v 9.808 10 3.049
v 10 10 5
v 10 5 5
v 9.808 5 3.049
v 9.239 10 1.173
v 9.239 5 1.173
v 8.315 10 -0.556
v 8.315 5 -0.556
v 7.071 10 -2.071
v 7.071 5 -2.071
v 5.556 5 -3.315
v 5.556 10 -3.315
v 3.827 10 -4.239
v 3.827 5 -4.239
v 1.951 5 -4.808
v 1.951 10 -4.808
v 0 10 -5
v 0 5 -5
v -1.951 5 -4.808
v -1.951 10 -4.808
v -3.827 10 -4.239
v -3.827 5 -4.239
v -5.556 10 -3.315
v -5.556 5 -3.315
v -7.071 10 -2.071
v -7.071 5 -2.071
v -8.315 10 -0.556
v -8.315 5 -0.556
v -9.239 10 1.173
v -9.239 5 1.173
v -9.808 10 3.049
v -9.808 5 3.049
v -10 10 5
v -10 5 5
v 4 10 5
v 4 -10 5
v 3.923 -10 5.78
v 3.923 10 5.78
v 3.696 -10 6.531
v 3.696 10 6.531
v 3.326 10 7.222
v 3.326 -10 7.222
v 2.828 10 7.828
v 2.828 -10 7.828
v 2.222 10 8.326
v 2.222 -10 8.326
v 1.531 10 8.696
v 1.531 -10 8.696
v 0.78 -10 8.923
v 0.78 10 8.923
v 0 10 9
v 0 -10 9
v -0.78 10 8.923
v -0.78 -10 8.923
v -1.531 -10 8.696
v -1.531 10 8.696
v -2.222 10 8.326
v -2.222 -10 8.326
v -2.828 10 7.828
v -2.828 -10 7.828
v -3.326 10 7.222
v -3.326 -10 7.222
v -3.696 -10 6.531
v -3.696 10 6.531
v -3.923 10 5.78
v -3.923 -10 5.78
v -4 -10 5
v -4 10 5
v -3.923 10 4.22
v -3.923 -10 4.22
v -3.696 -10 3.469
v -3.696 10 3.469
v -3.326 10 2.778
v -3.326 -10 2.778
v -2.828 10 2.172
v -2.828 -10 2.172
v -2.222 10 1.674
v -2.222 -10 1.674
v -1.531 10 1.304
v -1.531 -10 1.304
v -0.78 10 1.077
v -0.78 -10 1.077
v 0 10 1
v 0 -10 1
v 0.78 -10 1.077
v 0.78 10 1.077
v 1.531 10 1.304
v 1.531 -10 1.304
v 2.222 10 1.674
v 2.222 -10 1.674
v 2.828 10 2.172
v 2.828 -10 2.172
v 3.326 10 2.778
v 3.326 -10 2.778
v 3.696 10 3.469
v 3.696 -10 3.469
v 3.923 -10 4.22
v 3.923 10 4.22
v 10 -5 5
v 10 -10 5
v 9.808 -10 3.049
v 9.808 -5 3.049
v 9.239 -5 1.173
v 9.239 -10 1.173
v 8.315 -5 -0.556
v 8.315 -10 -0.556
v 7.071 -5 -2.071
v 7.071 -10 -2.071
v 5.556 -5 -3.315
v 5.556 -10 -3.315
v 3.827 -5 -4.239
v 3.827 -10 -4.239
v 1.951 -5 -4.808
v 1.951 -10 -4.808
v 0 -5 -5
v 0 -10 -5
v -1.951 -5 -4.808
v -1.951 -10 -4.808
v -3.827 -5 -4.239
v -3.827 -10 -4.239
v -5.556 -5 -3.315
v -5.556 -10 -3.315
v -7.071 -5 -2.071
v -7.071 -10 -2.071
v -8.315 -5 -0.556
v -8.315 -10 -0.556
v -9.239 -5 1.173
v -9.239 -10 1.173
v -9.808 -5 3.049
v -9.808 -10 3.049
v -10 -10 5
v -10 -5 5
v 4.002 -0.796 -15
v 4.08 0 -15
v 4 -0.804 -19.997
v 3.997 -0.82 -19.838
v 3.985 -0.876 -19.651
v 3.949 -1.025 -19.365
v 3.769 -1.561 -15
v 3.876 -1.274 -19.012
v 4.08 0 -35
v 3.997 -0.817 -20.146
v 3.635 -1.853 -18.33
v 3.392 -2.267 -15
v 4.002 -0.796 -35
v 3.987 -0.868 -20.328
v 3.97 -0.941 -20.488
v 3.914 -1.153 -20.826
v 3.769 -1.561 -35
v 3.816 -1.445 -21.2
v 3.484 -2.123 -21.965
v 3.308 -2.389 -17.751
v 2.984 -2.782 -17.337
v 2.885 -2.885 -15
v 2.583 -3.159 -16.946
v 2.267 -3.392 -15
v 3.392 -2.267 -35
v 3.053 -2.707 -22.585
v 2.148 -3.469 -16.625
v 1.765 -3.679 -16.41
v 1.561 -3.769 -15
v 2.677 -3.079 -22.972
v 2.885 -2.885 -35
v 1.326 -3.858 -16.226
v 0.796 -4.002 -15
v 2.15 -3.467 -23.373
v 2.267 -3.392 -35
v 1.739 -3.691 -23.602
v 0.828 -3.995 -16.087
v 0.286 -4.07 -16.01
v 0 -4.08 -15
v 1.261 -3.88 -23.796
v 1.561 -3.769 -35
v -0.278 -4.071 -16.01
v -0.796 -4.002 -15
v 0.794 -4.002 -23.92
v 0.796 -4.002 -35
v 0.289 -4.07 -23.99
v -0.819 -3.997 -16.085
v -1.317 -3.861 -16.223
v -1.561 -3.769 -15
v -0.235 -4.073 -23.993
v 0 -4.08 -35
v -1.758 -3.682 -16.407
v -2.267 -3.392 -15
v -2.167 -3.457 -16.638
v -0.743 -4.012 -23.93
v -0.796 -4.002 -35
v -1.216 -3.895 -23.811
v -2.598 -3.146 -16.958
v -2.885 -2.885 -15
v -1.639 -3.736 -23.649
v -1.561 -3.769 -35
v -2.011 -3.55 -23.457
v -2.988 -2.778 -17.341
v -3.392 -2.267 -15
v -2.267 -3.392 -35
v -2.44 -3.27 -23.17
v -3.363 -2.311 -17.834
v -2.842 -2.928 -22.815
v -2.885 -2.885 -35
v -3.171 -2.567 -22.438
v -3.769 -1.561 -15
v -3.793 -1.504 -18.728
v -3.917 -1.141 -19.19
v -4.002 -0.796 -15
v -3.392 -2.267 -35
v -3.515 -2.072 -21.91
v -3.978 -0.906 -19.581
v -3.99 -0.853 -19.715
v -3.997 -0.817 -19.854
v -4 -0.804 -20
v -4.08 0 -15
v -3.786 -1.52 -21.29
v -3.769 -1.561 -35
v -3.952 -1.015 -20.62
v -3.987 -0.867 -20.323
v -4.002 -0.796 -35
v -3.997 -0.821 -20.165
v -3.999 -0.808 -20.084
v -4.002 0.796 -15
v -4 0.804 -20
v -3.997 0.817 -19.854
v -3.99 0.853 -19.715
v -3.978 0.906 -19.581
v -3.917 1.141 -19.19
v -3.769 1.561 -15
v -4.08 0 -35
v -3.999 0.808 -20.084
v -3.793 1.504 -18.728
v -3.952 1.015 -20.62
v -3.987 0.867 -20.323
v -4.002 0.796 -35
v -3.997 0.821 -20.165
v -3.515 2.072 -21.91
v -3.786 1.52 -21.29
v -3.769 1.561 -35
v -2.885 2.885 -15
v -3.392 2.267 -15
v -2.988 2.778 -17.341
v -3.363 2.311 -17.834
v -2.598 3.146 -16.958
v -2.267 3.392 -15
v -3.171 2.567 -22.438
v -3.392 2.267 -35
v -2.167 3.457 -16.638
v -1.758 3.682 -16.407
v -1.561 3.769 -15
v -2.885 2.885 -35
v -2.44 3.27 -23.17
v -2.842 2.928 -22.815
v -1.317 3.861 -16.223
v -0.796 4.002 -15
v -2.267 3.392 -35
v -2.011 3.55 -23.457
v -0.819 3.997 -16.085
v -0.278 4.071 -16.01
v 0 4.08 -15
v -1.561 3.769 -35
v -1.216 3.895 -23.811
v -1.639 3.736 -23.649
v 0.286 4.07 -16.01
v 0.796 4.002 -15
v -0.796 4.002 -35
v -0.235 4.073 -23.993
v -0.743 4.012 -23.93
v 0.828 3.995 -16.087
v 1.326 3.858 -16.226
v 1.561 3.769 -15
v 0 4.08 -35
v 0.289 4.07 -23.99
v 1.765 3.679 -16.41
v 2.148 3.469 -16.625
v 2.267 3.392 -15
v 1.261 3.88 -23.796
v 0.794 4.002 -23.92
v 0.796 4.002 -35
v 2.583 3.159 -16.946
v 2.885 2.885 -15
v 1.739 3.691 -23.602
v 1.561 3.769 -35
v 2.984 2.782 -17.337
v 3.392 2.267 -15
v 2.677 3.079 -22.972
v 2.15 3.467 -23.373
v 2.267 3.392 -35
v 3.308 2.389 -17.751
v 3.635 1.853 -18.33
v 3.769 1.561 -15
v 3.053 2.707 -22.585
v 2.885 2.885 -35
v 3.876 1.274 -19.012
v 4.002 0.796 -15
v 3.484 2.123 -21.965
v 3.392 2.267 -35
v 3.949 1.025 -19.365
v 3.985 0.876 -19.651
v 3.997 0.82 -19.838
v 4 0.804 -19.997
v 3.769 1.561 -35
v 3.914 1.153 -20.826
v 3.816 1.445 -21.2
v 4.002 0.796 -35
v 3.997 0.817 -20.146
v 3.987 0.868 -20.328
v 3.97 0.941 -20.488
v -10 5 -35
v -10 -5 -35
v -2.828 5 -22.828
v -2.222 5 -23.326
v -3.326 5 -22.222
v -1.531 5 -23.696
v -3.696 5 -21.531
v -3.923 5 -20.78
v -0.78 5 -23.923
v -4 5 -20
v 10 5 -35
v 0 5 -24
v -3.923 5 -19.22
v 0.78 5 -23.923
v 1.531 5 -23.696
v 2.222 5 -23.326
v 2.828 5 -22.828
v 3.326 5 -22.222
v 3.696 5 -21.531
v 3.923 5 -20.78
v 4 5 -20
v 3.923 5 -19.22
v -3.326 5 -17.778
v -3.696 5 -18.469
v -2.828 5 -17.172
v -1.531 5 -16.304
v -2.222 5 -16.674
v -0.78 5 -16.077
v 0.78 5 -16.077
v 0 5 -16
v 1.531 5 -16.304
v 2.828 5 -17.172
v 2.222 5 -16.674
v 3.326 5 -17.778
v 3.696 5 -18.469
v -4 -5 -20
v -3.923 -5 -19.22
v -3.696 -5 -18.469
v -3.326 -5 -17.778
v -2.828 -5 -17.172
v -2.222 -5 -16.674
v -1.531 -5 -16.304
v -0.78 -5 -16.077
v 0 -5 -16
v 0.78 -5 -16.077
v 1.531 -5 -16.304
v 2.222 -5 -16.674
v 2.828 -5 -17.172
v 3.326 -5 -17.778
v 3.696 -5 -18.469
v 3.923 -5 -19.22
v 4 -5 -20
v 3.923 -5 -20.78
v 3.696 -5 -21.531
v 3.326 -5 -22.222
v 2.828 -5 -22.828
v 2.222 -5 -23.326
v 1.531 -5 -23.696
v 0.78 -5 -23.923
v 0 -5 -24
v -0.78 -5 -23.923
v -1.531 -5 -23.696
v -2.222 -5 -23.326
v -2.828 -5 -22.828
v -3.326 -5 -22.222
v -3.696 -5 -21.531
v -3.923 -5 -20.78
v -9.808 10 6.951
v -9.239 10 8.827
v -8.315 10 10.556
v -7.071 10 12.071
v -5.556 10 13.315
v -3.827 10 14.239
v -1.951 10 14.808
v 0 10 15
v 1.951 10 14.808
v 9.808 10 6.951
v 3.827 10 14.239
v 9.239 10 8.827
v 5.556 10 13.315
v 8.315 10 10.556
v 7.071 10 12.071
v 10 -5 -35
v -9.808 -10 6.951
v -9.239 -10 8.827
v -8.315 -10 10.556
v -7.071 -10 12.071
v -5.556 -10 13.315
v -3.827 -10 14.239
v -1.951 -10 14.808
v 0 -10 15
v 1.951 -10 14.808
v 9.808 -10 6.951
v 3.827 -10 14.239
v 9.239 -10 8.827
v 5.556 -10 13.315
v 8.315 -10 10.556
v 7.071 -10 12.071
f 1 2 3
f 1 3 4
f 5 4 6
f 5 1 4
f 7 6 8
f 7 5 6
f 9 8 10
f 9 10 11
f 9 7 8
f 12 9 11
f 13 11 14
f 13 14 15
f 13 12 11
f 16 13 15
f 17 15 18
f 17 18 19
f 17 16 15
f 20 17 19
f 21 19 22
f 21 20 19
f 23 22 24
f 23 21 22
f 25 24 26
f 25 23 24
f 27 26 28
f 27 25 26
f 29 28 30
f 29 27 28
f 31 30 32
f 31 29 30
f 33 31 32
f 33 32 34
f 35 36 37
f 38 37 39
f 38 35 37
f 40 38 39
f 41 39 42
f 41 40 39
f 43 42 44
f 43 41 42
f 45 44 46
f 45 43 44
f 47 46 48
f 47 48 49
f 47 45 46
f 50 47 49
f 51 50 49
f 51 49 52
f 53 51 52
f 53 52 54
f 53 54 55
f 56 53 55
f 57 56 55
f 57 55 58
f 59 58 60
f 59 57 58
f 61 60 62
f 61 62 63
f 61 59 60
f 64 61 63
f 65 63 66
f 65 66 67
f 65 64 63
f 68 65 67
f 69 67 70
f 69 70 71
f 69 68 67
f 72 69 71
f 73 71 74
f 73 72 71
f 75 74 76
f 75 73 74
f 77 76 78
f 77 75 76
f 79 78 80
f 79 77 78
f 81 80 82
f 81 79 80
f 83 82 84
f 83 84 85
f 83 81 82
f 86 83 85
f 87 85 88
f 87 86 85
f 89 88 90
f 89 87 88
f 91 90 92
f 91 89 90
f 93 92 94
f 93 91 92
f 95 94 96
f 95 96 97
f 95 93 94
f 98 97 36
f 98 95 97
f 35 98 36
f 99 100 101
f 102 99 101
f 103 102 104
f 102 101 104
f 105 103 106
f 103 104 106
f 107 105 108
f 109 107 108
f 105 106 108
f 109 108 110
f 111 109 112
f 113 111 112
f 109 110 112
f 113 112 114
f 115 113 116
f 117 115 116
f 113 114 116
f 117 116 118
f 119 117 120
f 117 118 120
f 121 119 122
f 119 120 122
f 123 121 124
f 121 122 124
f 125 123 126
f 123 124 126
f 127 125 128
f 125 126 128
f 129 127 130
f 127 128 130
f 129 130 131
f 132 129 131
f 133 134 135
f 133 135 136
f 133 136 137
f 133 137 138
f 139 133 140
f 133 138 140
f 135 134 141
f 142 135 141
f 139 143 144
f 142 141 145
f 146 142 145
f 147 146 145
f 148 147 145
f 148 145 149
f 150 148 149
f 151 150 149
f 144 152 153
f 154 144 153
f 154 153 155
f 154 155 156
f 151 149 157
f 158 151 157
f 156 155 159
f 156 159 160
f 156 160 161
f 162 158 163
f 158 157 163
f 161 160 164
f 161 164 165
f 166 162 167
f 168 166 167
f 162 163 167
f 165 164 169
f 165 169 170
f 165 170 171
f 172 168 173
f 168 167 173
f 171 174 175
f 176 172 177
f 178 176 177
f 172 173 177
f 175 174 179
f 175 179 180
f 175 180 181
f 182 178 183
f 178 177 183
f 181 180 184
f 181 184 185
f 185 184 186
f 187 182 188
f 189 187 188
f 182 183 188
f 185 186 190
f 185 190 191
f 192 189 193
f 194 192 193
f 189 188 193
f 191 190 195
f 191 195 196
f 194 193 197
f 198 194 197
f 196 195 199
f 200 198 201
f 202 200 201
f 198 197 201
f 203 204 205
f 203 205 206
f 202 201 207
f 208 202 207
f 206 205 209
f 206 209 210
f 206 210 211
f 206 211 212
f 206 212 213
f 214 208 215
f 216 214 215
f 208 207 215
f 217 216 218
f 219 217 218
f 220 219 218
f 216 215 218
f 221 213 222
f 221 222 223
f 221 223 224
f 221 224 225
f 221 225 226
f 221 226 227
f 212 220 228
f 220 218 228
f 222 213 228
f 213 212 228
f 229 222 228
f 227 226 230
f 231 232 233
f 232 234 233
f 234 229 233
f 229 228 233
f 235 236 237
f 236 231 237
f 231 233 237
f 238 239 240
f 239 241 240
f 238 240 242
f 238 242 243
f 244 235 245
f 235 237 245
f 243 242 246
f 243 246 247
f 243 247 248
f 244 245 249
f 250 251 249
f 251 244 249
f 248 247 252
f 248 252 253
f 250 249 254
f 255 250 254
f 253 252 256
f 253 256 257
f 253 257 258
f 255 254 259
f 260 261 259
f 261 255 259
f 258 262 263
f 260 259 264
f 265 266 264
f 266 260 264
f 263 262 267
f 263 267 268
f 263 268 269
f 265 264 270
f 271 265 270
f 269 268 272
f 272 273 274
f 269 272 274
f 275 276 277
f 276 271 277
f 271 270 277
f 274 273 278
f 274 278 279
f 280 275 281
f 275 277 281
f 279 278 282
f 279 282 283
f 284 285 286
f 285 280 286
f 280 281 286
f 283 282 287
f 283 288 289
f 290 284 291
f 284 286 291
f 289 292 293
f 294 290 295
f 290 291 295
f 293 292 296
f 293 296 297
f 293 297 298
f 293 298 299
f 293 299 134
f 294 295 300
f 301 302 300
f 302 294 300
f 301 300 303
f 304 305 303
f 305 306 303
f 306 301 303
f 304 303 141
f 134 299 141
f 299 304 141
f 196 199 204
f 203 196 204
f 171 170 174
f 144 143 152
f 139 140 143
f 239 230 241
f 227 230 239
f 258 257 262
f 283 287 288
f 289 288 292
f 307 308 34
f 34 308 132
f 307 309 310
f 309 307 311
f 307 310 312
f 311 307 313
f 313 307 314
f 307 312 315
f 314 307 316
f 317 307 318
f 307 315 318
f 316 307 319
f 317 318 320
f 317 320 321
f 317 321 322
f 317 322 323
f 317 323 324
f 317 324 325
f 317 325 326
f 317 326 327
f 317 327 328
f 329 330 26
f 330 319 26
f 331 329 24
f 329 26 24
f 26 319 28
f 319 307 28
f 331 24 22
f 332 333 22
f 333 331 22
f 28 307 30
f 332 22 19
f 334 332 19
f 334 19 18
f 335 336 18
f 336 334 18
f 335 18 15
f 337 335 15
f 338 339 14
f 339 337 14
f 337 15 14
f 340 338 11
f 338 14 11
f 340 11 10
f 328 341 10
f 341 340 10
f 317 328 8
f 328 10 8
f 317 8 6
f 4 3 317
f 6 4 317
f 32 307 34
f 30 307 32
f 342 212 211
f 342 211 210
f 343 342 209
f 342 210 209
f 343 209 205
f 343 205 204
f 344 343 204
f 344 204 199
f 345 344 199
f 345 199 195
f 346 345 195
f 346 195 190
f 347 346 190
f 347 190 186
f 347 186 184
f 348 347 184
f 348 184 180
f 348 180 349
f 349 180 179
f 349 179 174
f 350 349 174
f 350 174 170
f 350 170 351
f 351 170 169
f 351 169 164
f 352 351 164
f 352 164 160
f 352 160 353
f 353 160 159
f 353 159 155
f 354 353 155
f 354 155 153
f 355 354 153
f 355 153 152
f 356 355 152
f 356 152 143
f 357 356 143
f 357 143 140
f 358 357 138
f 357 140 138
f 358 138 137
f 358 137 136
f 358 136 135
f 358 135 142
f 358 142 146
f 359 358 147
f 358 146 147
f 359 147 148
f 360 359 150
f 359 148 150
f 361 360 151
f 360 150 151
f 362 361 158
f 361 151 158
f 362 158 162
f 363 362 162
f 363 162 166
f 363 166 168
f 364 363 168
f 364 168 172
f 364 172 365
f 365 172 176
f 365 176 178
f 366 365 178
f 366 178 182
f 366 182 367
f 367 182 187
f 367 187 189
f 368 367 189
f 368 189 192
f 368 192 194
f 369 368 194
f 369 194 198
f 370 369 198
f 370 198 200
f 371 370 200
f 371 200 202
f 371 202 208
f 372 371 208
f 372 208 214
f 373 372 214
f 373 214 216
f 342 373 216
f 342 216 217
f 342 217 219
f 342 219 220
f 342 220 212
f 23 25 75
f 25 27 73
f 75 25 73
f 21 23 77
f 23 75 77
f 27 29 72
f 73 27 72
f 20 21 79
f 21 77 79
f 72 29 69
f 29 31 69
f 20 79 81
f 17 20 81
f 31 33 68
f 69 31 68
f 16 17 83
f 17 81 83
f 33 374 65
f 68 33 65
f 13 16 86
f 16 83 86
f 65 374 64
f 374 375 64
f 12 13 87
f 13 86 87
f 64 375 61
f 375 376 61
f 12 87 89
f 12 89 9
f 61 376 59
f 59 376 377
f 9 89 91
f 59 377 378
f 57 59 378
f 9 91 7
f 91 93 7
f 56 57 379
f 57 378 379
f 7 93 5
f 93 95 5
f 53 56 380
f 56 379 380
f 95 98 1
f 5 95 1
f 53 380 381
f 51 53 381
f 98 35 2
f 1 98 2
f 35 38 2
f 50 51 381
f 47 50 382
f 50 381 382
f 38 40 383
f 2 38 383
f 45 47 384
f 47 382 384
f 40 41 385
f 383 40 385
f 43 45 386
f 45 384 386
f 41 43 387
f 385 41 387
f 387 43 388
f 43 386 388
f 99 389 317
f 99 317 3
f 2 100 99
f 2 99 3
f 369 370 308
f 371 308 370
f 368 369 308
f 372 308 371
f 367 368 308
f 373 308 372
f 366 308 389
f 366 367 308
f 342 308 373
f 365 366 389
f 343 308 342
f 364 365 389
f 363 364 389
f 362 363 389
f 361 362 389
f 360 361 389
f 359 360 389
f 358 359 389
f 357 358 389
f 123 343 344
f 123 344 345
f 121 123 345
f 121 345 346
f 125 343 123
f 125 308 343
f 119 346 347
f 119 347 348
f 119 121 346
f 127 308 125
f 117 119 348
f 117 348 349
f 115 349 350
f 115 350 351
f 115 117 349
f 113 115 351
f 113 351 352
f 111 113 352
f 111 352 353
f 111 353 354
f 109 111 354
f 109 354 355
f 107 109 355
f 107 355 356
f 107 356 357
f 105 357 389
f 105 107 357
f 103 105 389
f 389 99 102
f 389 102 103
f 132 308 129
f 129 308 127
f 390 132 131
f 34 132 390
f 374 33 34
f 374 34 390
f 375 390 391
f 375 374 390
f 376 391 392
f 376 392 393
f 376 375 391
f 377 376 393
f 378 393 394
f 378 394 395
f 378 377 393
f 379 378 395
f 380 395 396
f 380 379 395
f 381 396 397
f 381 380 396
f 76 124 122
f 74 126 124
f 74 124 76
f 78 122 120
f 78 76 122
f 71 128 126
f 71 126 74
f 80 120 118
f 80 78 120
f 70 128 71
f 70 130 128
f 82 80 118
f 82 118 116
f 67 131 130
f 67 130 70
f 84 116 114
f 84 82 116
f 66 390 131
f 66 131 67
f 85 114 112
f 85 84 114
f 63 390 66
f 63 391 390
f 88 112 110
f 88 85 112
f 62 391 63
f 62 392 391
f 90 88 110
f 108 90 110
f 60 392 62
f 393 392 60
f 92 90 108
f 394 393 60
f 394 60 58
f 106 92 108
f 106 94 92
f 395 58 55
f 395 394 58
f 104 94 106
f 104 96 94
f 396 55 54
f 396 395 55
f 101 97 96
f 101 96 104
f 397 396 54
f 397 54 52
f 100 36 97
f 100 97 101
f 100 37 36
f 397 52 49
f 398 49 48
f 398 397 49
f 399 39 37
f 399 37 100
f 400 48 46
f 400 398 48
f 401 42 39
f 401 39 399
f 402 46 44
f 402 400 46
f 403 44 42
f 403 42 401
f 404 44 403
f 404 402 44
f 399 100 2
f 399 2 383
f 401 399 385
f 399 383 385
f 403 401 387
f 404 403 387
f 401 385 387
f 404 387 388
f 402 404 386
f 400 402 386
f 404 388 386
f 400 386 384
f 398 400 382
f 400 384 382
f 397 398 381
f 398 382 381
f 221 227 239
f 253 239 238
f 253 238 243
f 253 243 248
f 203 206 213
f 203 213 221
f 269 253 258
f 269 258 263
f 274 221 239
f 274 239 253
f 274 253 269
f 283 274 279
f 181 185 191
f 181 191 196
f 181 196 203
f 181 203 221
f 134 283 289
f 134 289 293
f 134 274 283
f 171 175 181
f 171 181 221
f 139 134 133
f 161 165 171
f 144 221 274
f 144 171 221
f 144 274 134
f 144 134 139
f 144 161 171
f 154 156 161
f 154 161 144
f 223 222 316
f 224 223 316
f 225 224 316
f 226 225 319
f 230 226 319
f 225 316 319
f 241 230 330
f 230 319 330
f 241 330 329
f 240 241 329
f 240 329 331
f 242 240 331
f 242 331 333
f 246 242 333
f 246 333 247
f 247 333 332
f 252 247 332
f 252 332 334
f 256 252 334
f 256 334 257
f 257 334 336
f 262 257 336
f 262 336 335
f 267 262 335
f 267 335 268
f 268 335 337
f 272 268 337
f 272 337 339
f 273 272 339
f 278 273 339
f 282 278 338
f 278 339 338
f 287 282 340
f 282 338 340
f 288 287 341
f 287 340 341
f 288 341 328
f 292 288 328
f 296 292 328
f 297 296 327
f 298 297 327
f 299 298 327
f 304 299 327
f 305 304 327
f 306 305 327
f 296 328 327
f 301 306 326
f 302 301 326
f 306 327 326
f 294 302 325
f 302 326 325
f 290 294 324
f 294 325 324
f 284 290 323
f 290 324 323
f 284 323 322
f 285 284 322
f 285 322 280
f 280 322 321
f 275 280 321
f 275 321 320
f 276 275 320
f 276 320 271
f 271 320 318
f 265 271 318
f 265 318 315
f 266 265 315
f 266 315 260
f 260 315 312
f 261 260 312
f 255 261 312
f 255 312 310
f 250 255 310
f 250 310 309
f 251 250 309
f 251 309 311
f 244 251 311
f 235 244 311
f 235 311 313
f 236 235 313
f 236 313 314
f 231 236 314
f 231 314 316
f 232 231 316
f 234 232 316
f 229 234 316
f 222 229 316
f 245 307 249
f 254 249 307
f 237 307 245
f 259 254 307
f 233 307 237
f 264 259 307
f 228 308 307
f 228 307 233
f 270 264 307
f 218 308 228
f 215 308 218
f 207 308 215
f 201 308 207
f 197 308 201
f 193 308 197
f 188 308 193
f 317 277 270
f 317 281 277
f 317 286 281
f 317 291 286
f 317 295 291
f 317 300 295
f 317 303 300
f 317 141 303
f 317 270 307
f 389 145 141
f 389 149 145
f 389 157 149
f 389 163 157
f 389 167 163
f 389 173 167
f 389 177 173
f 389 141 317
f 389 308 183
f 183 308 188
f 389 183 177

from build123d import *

# Parameters (mm, degrees)
F0_W          = 20
F0_H          = 50
F0_R          = 4
F1_DEPTH      = 10
F1_DEPTH_BACK = 10
F2_R          = 9.99999
F3_R          = 4.08
F4_DEPTH      = 20
F6_D          = 8
F7_R          = 4
F8_DEPTH      = 5


# Not quite as in the source:
# - a fillet or chamfer is up to 0.001 mm smaller than in the source, because OpenCascade refuses the exact size
# - ends of sketch curves that miss each other by under 0.0002 mm in the source are joined
# - a pattern or mirror of a feature is missing from the dataset's text; its kind, count and spacing are read off the source's solid


with BuildPart() as f1:
    # F0 (on Front) → F1 (new body, two sides)
    with BuildSketch(Plane.XZ) as f1_sk:
        with Locations((0, -10)):
            Rectangle(F0_W, F0_H)
        with Locations((0, 5)):
            Circle(F0_R, mode=Mode.SUBTRACT)
    extrude(amount=F1_DEPTH)
    extrude(f1_sk.sketch, amount=-F1_DEPTH_BACK)

    # F2 (radius 10 in the source; OpenCascade refuses exactly that, so slightly less here)
    f2_edges = [f1.edges().sort_by_distance(p)[0] for p in [
        (-10, 0, 15),
        (10, 0, 15),
    ]]
    fillet(f2_edges, radius=F2_R)

    # F3 (on face) → F4 (cut)
    with BuildSketch(Plane(origin=(0, 0, -35), x_dir=(1, 0, 0), z_dir=(0, 0, -1))):
        Circle(F3_R)
    extrude(amount=-F4_DEPTH, mode=Mode.SUBTRACT)

    # F6 (through all)
    with Locations(Plane.XZ.offset(10)):
        with Locations((0, -20)):
            Hole(F6_D / 2)

    # F7 (on face) → F8 (cut)
    with BuildSketch(Plane.XZ.offset(10)):
        with BuildLine():
            Line((10, -35), (10, 5))
            ThreePointArc((10, 5), (-2.5e-06, -5), (-10, 5.000005))
            Line((-10, 5.000005), (-10, -35))
            Line((-10, -35), (10, -35))
        make_face()
        with Locations((0, -20)):
            Circle(F7_R, mode=Mode.SUBTRACT)
    f8 = extrude(amount=-F8_DEPTH, mode=Mode.SUBTRACT)

    # F8_copies: F8 across plane
    add(f8.mirror(Plane.ZX), mode=Mode.SUBTRACT)


solid = f1.part
